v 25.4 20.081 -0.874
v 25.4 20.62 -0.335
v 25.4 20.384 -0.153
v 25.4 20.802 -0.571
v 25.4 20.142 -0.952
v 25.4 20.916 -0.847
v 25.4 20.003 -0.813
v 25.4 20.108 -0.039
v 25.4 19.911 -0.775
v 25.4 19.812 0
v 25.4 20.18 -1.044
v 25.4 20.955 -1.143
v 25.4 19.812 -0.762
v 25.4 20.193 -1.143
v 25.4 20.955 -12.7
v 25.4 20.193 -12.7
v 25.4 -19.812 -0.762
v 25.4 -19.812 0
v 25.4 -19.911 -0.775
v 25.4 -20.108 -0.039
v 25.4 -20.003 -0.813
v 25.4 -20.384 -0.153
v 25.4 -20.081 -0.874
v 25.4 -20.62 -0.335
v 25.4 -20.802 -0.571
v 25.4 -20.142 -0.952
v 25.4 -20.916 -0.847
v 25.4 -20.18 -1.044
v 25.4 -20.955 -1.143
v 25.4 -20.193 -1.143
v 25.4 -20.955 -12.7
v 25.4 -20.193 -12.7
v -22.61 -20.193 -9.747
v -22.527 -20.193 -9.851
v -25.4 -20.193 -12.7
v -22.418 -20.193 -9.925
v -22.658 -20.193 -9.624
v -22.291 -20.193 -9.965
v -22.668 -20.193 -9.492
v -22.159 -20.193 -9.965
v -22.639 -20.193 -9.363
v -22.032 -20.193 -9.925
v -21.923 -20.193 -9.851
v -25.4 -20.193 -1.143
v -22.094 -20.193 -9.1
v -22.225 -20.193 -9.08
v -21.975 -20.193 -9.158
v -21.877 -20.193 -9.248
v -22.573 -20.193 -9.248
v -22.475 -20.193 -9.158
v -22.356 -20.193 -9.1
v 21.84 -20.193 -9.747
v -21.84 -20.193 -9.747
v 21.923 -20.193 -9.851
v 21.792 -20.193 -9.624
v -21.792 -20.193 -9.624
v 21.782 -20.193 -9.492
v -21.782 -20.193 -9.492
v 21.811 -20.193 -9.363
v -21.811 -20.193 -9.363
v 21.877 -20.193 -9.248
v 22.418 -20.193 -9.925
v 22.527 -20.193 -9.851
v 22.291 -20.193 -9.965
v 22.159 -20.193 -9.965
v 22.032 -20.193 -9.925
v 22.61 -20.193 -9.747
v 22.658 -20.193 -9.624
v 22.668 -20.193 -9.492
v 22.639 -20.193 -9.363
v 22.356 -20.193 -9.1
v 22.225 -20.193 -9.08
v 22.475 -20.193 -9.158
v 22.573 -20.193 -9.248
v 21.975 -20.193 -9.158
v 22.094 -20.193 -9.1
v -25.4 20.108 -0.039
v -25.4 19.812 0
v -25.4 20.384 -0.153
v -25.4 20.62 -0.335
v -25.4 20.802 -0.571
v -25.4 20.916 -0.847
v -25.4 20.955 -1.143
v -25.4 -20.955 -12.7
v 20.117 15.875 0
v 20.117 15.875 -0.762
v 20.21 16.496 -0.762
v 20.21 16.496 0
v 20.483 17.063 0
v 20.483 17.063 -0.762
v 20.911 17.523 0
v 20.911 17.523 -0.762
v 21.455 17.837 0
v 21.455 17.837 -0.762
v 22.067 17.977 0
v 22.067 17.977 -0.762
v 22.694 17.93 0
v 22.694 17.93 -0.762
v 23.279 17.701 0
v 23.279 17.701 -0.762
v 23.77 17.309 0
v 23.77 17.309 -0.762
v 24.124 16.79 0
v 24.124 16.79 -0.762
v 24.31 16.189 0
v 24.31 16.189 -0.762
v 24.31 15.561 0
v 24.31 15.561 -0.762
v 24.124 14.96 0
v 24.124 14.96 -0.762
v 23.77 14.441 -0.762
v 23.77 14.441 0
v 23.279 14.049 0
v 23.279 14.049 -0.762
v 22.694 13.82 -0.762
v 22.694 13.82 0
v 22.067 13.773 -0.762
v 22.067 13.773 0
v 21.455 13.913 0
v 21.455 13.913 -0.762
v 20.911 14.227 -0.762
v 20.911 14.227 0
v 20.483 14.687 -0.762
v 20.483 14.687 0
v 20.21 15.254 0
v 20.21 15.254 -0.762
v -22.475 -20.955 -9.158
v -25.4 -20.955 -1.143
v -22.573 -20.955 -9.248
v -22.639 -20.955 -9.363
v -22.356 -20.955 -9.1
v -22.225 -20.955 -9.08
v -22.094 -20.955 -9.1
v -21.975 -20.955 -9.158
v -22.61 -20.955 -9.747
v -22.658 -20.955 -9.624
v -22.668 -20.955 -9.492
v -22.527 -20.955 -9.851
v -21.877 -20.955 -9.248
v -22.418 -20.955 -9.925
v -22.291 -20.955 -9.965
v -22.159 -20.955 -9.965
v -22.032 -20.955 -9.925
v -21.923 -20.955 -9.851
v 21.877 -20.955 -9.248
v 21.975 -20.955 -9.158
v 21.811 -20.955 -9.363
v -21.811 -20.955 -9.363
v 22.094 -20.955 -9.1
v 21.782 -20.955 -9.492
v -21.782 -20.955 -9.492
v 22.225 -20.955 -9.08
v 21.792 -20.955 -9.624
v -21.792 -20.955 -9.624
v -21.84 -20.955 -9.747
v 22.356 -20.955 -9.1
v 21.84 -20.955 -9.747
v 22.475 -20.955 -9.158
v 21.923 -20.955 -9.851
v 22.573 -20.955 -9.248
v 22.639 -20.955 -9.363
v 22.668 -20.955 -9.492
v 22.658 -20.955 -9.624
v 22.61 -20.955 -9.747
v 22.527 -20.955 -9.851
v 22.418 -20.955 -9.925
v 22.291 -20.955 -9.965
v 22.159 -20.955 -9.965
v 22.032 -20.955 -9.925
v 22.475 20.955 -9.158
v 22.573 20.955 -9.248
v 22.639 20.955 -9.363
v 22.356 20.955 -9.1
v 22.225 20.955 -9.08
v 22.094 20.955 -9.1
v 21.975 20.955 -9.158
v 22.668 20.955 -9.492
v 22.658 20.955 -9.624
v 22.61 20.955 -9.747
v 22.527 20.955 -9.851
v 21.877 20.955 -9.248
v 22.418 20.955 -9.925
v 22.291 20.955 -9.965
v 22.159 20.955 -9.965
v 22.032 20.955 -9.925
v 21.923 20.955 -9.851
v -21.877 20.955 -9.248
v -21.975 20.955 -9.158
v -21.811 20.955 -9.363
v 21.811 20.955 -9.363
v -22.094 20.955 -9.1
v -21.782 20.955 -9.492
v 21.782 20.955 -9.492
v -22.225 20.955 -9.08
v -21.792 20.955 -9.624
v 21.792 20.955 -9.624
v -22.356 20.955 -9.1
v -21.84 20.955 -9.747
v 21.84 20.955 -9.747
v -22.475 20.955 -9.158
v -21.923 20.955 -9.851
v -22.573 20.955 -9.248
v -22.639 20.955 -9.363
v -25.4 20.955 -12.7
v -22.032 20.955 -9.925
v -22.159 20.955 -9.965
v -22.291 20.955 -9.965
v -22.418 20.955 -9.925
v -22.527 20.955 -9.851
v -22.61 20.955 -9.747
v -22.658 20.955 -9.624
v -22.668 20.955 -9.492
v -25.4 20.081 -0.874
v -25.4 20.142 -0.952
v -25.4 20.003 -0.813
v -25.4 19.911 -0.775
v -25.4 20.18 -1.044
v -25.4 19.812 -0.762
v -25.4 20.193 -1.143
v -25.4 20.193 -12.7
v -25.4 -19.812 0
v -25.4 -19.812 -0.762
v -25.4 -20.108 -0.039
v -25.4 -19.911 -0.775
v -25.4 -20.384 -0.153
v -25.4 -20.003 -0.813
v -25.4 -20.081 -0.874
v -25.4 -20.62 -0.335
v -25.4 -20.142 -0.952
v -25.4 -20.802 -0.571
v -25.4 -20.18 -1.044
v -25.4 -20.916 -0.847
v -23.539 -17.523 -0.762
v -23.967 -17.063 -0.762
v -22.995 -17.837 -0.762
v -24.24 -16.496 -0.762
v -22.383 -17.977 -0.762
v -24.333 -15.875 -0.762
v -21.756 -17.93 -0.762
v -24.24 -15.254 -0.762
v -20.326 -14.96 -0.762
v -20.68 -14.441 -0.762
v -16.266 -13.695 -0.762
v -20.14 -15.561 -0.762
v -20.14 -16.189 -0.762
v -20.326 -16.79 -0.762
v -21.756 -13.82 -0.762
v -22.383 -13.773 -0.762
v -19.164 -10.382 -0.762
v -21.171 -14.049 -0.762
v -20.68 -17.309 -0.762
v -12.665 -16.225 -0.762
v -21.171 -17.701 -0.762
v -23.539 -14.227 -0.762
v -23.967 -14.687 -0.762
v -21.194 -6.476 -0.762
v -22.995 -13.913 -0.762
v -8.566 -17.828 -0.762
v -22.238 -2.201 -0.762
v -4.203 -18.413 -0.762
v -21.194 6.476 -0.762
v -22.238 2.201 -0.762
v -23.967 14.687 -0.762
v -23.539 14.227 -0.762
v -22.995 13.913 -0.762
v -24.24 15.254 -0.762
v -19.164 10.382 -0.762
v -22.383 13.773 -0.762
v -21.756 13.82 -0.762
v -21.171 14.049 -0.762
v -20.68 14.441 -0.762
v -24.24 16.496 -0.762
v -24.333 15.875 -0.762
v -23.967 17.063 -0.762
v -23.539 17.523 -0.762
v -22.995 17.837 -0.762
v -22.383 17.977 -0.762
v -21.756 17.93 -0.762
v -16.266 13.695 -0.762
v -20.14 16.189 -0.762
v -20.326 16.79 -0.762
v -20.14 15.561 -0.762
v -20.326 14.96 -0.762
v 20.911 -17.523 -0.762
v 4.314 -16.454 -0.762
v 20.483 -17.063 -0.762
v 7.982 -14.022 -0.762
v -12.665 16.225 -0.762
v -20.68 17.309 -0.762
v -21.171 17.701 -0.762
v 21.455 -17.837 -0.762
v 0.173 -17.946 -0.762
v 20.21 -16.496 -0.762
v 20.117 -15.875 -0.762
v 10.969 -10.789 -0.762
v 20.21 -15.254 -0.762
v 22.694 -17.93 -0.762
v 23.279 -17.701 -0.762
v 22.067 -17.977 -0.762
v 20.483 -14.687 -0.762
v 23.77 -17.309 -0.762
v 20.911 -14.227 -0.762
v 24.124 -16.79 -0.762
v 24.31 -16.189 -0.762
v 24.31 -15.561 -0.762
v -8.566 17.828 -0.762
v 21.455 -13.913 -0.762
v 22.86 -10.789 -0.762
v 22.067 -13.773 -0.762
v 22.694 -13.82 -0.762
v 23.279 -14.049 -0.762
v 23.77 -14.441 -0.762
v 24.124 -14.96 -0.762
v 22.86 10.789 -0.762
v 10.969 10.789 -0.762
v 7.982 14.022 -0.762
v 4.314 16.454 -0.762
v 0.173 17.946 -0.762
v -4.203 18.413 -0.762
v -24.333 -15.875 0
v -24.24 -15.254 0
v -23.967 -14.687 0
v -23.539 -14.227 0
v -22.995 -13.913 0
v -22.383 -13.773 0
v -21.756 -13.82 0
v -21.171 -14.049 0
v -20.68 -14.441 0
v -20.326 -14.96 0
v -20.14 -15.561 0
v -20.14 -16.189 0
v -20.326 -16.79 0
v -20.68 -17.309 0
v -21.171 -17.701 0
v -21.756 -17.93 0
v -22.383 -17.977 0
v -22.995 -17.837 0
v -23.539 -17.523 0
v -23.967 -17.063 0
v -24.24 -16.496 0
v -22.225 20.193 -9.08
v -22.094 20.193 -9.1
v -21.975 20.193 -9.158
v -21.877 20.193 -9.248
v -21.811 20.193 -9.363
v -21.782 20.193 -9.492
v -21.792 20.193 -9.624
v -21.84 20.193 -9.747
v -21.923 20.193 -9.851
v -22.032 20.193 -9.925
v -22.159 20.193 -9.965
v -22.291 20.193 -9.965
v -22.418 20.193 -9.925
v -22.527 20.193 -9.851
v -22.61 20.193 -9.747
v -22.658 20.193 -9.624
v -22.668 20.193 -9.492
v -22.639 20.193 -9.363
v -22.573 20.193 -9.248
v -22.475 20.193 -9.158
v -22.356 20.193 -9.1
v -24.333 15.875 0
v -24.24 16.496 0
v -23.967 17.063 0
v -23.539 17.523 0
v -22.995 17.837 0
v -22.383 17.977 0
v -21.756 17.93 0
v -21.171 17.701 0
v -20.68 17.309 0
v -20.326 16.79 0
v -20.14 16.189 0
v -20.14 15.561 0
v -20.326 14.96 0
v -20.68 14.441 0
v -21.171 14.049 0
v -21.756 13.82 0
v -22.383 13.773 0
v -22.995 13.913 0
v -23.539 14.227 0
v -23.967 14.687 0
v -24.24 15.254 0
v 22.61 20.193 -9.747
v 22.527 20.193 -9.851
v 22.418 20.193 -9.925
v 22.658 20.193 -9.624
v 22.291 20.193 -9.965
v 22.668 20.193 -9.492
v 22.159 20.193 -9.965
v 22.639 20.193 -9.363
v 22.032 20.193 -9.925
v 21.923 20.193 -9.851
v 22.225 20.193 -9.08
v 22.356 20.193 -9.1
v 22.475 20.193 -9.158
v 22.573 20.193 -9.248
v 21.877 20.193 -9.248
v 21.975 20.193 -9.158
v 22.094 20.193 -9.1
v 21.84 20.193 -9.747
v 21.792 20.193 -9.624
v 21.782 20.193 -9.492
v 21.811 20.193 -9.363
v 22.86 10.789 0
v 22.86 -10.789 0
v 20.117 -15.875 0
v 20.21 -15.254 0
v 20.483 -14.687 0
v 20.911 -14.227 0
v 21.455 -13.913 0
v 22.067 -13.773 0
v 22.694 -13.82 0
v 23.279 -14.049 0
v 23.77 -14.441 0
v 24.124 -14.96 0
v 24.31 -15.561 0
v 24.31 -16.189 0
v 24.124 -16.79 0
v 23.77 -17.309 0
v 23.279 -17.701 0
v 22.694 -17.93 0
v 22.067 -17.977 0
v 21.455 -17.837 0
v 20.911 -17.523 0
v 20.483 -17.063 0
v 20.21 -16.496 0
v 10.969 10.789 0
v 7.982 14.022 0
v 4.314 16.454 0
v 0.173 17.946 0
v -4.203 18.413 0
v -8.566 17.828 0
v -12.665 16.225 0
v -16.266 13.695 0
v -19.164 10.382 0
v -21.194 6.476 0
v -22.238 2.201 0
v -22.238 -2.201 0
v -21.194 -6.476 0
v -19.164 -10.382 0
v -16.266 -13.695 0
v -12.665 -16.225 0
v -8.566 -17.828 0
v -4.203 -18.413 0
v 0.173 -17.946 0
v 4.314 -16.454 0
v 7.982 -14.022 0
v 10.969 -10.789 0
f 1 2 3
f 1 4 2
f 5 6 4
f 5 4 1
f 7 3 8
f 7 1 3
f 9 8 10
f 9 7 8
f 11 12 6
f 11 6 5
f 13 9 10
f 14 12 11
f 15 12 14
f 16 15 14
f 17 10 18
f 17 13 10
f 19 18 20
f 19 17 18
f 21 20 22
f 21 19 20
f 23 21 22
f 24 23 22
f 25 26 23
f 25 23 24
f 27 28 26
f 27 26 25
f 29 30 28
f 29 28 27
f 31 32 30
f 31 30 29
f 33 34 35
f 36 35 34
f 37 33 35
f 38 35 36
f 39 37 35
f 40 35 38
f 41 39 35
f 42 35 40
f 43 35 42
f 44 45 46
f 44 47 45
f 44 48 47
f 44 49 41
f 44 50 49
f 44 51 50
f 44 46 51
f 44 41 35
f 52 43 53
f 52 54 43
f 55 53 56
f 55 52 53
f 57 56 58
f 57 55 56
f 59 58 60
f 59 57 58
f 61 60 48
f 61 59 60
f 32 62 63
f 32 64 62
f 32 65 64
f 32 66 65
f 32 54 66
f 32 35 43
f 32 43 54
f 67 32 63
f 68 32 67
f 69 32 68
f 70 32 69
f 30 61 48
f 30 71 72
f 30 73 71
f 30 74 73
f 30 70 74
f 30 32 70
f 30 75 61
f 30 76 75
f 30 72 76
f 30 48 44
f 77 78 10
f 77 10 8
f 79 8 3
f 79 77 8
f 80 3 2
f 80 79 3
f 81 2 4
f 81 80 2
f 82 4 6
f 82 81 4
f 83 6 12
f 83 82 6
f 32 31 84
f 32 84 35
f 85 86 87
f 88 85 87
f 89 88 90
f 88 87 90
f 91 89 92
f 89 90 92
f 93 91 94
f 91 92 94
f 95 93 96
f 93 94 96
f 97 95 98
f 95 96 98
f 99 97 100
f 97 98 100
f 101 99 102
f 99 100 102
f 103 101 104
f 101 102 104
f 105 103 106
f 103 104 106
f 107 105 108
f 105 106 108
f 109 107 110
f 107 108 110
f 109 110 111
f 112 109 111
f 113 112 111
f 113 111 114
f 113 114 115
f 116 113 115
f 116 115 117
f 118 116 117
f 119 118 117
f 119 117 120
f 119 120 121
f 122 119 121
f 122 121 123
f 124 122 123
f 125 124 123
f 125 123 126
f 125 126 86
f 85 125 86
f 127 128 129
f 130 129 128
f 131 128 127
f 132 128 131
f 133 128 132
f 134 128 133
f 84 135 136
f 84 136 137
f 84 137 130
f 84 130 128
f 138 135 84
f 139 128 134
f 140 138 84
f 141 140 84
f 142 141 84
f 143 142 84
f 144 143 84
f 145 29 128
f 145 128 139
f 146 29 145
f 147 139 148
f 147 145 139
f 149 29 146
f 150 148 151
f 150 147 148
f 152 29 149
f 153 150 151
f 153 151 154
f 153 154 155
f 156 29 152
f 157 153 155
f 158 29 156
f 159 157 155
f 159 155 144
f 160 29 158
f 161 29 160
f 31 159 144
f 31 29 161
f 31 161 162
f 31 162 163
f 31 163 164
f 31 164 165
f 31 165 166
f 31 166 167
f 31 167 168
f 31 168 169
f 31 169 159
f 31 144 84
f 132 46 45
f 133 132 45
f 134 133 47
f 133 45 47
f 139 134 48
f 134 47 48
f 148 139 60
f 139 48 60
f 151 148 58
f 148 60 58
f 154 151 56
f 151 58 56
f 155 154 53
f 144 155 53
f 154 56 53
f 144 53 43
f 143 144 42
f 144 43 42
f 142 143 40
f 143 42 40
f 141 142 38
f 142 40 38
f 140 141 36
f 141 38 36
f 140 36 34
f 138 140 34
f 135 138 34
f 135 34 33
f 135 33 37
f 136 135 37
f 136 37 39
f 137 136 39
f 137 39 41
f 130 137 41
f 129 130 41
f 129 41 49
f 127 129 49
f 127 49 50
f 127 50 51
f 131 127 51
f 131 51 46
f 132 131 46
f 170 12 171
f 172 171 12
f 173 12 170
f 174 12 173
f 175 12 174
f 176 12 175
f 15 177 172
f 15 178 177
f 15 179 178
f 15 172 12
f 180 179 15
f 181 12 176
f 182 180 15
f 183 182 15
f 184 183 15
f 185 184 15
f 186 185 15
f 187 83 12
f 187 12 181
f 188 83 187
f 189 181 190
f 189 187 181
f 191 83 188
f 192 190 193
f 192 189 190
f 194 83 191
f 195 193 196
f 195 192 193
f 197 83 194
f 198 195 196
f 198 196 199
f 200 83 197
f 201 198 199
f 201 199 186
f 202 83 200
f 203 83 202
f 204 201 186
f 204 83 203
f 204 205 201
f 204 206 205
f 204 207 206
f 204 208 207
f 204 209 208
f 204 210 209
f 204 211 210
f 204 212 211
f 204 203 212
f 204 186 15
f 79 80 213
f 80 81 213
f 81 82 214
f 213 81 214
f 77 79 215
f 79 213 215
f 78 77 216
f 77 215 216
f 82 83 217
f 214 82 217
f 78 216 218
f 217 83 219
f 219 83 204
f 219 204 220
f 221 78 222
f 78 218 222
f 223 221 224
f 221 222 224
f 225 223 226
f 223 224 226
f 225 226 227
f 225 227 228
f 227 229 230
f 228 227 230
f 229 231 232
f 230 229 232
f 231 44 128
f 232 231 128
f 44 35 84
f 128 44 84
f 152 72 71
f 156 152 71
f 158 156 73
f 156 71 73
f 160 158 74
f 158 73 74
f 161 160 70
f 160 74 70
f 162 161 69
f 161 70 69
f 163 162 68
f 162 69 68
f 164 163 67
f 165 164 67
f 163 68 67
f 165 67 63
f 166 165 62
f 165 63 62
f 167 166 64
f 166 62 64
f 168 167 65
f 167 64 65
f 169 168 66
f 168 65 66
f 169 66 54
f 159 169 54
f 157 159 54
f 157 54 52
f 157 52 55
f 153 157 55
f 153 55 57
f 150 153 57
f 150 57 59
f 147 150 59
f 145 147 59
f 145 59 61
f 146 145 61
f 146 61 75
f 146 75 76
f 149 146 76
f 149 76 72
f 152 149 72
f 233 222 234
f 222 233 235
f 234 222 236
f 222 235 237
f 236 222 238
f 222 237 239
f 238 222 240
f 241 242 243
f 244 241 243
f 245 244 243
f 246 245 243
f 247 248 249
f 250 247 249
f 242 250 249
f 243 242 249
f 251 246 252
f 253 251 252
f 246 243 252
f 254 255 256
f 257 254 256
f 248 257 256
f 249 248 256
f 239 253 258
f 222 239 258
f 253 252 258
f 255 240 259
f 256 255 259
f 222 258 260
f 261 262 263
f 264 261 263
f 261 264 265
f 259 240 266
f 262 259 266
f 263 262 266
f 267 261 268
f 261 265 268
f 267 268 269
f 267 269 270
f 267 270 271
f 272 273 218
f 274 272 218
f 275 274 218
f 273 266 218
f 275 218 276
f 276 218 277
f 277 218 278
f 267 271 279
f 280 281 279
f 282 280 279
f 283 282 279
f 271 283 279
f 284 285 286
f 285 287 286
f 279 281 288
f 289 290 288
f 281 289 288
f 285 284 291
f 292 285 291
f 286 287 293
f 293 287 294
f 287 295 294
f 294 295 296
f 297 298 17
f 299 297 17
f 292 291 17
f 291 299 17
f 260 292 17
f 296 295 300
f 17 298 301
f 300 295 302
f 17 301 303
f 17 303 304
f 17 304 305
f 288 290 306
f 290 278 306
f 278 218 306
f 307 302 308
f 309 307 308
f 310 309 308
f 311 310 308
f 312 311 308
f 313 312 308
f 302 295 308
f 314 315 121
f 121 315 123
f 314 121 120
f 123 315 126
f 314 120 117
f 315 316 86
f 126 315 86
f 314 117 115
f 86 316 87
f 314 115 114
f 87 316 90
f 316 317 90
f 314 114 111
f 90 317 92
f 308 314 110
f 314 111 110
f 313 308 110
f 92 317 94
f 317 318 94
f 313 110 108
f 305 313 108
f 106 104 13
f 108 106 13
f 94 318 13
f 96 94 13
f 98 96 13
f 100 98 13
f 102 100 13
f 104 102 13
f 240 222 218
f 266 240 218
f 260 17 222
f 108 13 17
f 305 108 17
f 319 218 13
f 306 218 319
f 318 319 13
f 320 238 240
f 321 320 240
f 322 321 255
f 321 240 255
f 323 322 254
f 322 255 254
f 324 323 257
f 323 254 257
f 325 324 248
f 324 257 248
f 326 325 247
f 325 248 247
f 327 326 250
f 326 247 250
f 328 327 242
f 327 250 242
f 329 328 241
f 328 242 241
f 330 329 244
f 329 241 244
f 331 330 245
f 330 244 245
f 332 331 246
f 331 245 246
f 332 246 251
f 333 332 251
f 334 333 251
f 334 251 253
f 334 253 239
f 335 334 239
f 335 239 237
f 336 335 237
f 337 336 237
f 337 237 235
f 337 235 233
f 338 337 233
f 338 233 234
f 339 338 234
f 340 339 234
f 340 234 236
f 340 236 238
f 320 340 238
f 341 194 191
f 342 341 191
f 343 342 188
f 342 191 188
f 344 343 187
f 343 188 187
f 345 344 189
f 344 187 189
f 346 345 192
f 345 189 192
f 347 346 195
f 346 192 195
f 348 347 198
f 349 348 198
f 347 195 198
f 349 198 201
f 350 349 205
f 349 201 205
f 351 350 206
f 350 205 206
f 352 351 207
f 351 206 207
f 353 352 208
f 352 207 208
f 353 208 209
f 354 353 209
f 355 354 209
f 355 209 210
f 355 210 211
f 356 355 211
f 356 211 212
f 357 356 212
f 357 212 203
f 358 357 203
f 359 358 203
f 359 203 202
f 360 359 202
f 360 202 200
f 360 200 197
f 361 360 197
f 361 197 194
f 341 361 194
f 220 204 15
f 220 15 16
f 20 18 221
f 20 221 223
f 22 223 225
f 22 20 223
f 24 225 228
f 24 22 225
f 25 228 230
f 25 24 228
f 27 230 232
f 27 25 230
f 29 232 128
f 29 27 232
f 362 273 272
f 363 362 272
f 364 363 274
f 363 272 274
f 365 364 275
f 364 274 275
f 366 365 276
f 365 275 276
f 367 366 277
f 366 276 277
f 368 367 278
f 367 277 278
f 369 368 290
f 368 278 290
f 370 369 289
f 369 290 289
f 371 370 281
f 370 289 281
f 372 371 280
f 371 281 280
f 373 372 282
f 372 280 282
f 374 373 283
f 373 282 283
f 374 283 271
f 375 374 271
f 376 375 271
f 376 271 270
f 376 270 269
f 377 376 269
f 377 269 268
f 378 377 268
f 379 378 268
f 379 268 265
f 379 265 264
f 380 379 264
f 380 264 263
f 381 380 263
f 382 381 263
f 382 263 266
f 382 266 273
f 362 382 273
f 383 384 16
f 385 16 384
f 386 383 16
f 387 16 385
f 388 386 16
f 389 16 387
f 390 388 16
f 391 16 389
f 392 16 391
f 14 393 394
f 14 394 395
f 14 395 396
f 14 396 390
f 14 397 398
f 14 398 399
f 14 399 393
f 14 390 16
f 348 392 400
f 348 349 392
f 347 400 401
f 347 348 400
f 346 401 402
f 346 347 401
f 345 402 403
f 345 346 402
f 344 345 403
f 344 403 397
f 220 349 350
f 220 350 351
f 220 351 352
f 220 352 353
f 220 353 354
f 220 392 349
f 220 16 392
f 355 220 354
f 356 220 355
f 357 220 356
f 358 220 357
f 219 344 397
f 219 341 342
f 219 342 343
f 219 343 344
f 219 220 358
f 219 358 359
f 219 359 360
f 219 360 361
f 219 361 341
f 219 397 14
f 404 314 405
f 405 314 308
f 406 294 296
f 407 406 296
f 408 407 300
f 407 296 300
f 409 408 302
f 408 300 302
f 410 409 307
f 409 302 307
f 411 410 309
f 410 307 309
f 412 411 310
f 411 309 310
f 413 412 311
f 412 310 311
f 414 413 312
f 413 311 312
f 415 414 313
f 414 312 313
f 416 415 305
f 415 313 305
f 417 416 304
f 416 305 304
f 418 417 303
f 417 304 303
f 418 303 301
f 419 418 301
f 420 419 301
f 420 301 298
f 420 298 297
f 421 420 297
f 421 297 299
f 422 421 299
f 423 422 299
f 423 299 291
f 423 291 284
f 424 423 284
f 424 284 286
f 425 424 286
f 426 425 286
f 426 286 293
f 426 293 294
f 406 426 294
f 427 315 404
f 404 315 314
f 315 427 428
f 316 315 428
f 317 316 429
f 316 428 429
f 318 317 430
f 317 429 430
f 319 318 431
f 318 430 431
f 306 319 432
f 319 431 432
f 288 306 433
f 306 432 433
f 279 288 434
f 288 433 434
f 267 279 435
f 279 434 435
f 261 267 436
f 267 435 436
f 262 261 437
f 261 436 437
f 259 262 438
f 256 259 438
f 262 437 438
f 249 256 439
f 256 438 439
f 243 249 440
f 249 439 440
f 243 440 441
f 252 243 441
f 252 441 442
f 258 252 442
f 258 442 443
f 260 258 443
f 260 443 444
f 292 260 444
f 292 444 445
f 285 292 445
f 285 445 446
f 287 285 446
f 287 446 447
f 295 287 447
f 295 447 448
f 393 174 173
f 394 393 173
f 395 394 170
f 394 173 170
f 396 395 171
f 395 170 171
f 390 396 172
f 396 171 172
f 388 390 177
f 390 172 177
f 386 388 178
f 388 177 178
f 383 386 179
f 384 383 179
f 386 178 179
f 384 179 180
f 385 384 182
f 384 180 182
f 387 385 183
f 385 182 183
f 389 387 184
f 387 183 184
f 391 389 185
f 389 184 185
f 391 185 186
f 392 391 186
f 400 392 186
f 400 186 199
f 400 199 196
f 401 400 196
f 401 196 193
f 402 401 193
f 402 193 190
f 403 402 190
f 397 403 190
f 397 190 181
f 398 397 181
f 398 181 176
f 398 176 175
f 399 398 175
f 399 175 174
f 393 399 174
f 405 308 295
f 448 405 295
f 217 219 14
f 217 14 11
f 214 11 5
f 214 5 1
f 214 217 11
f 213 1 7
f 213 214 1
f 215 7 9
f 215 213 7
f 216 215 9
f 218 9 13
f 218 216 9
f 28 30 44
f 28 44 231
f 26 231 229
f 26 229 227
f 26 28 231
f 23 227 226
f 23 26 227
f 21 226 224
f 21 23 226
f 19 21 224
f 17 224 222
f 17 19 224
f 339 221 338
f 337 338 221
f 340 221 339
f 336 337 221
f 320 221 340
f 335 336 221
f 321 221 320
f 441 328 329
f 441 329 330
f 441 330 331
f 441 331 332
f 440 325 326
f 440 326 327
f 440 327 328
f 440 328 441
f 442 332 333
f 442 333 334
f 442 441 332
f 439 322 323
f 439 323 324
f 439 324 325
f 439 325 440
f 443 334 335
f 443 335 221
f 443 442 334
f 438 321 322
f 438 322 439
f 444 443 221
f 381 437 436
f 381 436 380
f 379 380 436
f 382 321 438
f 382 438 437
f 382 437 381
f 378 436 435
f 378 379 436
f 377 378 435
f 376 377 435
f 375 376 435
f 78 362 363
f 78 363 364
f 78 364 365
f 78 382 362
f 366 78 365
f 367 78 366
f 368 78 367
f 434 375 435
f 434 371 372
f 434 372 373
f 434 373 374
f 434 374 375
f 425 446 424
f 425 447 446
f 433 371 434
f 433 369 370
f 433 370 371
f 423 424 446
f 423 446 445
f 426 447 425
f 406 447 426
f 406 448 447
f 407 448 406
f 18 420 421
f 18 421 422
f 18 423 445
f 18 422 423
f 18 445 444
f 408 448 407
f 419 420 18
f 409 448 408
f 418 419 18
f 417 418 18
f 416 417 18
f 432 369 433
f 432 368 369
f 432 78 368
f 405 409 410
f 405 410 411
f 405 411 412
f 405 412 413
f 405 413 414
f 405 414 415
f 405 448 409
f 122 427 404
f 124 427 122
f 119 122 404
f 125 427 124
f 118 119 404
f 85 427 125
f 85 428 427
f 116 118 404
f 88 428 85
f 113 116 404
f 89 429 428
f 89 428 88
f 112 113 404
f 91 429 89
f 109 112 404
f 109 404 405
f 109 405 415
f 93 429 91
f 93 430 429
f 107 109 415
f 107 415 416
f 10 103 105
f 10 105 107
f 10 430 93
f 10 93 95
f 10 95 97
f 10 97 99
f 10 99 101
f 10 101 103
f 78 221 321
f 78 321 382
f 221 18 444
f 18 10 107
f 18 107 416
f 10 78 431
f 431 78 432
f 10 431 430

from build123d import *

# Parameters (mm, degrees)
SKETCH1_W                      = 50.8
SKETCH1_H                      = 41.91
BASE_FLANGE1_DEPTH             = 0.762
EDGE_FLANGE1_STRIP_W           = 3.81
EDGE_FLANGE1_STRIP_H           = 0.762
EDGE_FLANGE1_STRIP_CUT_DEPTH   = 50.8
EDGE_FLANGE1_STRIP_2_W         = 3.81
EDGE_FLANGE1_STRIP_2_H         = 0.762
EDGE_FLANGE1_STRIP_CUT_2_DEPTH = 50.8
EDGE_FLANGE1_DEPTH             = 50.8
EDGE_FLANGE1_BEND_DEPTH        = 50.8
SKETCH14_R                     = 18.415
CUT_EXTRUDE1_DEPTH             = 2.54
SKETCH16_R                     = 0.4445
CUT_EXTRUDE4_DEPTH             = 53.848
SKETCH17_R                     = 2.1082
CUT_EXTRUDE5_DEPTH             = 36.025531673
CUT_EXTRUDE6_DEPTH             = 36.025531673


# Sheet-metal steps are written as plain solids
with BuildPart() as part:
    # Sketch1 → Base-Flange1 (new body)
    with BuildSketch(Plane.XY):
        Rectangle(SKETCH1_W, SKETCH1_H)
    extrude(amount=-BASE_FLANGE1_DEPTH)

    # Edge-Flange1 strip (across the edge) → Edge-Flange1 strip cut (cut)
    with BuildSketch(Plane(origin=(-25.4, 20.955, -0.762), x_dir=(0, -1, 0), z_dir=(1, 0, 0))):
        with Locations((-0.762, -0.381)):
            Rectangle(EDGE_FLANGE1_STRIP_W, EDGE_FLANGE1_STRIP_H)
    extrude(amount=EDGE_FLANGE1_STRIP_CUT_DEPTH, mode=Mode.SUBTRACT)

    # Edge-Flange1 strip 2 (across the edge) → Edge-Flange1 strip cut 2 (cut)
    with BuildSketch(Plane(origin=(25.4, -20.955, -0.762), x_dir=(0, 1, 0), z_dir=(-1, 0, 0))):
        with Locations((-0.762, -0.381)):
            Rectangle(EDGE_FLANGE1_STRIP_2_W, EDGE_FLANGE1_STRIP_2_H)
    extrude(amount=EDGE_FLANGE1_STRIP_CUT_2_DEPTH, mode=Mode.SUBTRACT)

    # Edge-Flange1 section (across the edge) → Edge-Flange1 (add)
    with BuildSketch(Plane(origin=(-25.4, 20.955, -0.762), x_dir=(0, -1, 0), z_dir=(1, 0, 0))):
        with BuildLine():
            Line((0, 0.381), (0, 11.938))
            Line((0, 11.938), (0.762, 11.938))
            Line((0.762, 11.938), (0.762, 0.381))
            ThreePointArc((0.762, 0.381), (0.873592316, 0.111592316), (1.143, 0))
            Line((1.143, 0), (1.143, -0.762))
            ThreePointArc((1.143, -0.762), (0.334776949, -0.427223051), (0, 0.381))
        make_face()
    extrude(amount=EDGE_FLANGE1_DEPTH)

    # Edge-Flange1 section 2 (across the edge) → Edge-Flange1 bend (add)
    with BuildSketch(Plane(origin=(25.4, -20.955, -0.762), x_dir=(0, 1, 0), z_dir=(-1, 0, 0))):
        with BuildLine():
            Line((0, 0.381), (0, 11.938))
            Line((0, 11.938), (0.762, 11.938))
            Line((0.762, 11.938), (0.762, 0.381))
            ThreePointArc((0.762, 0.381), (0.873592316, 0.111592316), (1.143, 0))
            Line((1.143, 0), (1.143, -0.762))
            ThreePointArc((1.143, -0.762), (0.334776949, -0.427223051), (0, 0.381))
        make_face()
    extrude(amount=EDGE_FLANGE1_BEND_DEPTH)

    # Sketch14 → Cut-Extrude1 (cut)
    with BuildSketch(Plane.XY.offset(0.889)):
        with Locations(Location((-3.954996568, 0, 0), (0, 0, 180))):
            Circle(SKETCH14_R)
    extrude(amount=-CUT_EXTRUDE1_DEPTH, mode=Mode.SUBTRACT)

    # Sketch16 → Cut-Extrude4 (cut)
    with BuildSketch(Plane(origin=(0, 20.955, 0), x_dir=(1, 0, 0), z_dir=(0, 1, 0))):
        with Locations(Location((22.225, 9.525, 0), (0, 0, 270))):
            Circle(SKETCH16_R)
        with Locations(Location((-22.225, 9.525, 0), (0, 0, 270))):
            Circle(SKETCH16_R)
    extrude(amount=-CUT_EXTRUDE4_DEPTH, mode=Mode.SUBTRACT)

    # Sketch17 → Cut-Extrude5 (cut, through all)
    with BuildSketch(Plane(origin=(0, 0, -0.762), x_dir=(-1, 0, 0), z_dir=(0, 0, -1))):
        with Locations((-22.225, 15.875)):
            Circle(SKETCH17_R)
        with Locations((-22.225, -15.875)):
            Circle(SKETCH17_R)
        with Locations((22.225, -15.875)):
            Circle(SKETCH17_R)
        with Locations((22.225, 15.875)):
            Circle(SKETCH17_R)
    extrude(amount=-CUT_EXTRUDE5_DEPTH, mode=Mode.SUBTRACT)

    # Sketch18 → Cut-Extrude6 (cut, through all)
    with BuildSketch(Plane(origin=(0, 0, -0.762), x_dir=(-1, 0, 0), z_dir=(0, 0, -1))):
        with BuildLine():
            Line((-10.968730797, 10.788632283), (-22.86, 10.788632283))
            Line((-22.86, 10.788632283), (-22.86, -10.788632283))
            Line((-22.86, -10.788632283), (-10.968730797, -10.788632283))
            ThreePointArc((-10.968730797, -10.788632283), (-14.460003432, 0), (-10.968730797, 10.788632283))
        make_face()
    extrude(amount=-CUT_EXTRUDE6_DEPTH, mode=Mode.SUBTRACT)


solid = part.part
